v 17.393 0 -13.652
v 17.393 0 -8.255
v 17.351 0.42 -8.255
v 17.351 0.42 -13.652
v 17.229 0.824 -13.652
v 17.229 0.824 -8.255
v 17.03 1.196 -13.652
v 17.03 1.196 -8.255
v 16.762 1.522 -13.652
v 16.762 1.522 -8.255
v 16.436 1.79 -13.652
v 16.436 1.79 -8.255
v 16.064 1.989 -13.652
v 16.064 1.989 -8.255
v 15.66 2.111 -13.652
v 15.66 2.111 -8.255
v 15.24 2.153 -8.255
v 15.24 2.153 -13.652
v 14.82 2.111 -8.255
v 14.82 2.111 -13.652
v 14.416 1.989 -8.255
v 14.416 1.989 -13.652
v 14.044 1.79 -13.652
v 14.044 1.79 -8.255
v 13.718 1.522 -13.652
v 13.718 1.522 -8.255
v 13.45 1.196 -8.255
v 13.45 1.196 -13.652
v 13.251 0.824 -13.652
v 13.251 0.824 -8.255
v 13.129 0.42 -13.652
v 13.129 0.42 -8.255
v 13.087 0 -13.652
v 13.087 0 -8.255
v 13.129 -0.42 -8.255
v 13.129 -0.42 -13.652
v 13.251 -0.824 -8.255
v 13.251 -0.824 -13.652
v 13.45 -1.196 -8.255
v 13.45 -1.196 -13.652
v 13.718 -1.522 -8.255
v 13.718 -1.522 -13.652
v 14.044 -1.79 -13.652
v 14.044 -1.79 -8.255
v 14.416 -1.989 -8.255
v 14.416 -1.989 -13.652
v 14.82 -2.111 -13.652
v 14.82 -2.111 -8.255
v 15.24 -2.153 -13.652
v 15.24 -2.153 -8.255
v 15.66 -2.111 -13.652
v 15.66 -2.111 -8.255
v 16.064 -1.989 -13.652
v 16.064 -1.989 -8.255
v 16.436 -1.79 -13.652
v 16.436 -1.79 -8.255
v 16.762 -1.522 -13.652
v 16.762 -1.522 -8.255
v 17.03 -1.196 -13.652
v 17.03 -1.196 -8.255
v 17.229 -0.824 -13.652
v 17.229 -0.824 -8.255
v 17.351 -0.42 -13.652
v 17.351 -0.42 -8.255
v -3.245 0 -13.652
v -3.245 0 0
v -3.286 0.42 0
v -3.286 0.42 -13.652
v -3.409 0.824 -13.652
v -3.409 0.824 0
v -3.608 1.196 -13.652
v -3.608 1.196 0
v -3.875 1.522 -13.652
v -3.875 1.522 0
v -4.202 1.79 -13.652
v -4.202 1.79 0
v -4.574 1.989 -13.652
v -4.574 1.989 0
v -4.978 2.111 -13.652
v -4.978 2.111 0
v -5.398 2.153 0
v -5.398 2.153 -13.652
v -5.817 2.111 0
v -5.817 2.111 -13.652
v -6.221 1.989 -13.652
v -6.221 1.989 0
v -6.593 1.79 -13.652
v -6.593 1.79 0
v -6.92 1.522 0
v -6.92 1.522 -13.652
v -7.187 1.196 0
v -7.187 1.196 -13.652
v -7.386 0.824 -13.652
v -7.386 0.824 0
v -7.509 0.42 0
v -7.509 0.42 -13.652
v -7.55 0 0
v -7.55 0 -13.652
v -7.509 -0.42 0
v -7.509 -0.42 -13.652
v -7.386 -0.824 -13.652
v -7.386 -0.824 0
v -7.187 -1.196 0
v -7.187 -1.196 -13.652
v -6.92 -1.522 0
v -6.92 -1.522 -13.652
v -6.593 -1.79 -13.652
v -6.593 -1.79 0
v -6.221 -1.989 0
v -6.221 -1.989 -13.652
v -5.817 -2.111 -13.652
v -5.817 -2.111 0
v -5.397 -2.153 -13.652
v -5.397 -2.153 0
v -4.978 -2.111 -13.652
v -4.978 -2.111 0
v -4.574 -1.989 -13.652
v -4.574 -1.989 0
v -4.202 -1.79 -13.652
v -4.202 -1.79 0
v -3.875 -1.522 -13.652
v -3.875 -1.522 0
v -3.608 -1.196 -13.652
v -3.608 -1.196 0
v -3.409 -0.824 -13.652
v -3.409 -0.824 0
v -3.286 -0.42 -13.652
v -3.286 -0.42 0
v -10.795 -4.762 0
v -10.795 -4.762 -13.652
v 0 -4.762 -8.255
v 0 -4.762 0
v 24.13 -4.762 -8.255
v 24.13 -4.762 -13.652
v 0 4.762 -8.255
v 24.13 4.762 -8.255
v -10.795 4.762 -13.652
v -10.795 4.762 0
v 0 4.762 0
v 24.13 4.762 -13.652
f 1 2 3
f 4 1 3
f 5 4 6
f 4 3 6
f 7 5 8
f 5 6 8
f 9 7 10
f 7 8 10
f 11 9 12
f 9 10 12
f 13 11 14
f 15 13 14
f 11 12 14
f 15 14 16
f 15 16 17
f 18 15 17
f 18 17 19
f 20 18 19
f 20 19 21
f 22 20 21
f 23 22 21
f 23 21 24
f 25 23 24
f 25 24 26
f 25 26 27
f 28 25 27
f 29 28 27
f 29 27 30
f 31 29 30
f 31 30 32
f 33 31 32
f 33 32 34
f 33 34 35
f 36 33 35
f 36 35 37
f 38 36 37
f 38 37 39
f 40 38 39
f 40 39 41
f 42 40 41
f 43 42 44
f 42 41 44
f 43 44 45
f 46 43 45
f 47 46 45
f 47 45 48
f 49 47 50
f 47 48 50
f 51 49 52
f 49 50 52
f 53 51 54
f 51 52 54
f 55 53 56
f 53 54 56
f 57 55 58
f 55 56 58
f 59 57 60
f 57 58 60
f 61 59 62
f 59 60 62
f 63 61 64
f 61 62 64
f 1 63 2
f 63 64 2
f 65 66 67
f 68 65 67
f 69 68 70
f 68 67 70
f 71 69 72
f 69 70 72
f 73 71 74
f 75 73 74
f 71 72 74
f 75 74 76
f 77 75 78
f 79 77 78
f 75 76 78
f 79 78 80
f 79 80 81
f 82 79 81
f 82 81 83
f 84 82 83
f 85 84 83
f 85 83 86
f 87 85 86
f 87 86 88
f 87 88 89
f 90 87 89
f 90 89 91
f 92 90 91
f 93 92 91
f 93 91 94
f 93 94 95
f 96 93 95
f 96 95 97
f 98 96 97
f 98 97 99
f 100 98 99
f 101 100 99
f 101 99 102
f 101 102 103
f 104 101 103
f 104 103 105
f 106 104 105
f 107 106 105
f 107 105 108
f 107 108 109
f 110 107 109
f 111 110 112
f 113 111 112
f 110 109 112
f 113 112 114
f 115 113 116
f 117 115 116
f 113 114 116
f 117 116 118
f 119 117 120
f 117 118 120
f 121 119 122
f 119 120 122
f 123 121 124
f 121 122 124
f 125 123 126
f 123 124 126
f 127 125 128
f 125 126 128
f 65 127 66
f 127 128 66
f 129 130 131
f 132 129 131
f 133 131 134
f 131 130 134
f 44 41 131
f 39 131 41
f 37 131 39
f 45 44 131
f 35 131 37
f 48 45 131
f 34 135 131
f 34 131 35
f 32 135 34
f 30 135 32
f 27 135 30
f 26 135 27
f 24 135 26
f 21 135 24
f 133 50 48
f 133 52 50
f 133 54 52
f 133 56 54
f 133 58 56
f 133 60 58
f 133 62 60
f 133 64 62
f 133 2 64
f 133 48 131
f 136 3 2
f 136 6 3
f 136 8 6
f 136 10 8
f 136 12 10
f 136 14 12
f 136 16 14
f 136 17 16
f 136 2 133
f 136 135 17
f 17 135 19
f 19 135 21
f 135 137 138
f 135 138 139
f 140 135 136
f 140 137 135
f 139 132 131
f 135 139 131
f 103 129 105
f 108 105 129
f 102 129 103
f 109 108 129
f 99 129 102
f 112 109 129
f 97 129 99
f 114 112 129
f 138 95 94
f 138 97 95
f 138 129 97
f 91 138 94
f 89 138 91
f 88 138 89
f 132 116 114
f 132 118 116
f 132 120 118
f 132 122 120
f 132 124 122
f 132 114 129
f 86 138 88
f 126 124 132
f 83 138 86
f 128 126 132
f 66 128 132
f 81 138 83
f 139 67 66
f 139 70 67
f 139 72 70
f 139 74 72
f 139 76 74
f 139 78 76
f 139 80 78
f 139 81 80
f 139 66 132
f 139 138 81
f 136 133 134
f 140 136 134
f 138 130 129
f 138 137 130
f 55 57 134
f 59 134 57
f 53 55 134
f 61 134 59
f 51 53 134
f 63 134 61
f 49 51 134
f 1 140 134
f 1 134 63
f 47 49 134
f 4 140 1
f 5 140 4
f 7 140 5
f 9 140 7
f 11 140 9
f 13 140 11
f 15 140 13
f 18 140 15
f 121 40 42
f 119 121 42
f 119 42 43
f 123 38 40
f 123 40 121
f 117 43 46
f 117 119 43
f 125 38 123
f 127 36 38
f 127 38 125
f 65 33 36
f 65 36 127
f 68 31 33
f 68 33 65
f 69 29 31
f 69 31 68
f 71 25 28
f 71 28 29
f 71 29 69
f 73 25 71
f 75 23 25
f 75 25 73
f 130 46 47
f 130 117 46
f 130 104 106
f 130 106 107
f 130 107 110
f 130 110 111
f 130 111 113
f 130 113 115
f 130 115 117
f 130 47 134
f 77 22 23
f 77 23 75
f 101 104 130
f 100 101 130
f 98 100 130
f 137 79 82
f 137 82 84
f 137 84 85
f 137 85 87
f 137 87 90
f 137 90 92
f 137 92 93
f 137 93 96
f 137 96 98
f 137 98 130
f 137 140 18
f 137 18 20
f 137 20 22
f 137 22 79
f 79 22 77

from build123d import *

# Parameters (mm, degrees)
BOSS_EXTRUDE1_DEPTH = 4.7625
SKETCH3_R           = 2.15265
CUT_EXTRUDE1_DEPTH  = 29.13057167


with BuildPart() as part:
    # Sketch1 → Boss-Extrude1 (new, symmetric)
    with BuildSketch(Plane(origin=(0, 0, 0), x_dir=(1, 0, 0), z_dir=(0, 1, 0))):
        Polygon((0, 0), (0, 8.255), (24.13, 8.255), (24.13, 13.6525), (-10.795, 13.6525), (-10.795, 0), align=None)
    extrude(amount=BOSS_EXTRUDE1_DEPTH, both=True)

    # Sketch3 → Cut-Extrude1 (cut, through all)
    with BuildSketch(Plane.XY):
        with Locations((15.24, 0)):
            Circle(SKETCH3_R)
        with Locations((-5.3975, 0)):
            Circle(SKETCH3_R)
    extrude(amount=-CUT_EXTRUDE1_DEPTH, mode=Mode.SUBTRACT)


solid = part.part
